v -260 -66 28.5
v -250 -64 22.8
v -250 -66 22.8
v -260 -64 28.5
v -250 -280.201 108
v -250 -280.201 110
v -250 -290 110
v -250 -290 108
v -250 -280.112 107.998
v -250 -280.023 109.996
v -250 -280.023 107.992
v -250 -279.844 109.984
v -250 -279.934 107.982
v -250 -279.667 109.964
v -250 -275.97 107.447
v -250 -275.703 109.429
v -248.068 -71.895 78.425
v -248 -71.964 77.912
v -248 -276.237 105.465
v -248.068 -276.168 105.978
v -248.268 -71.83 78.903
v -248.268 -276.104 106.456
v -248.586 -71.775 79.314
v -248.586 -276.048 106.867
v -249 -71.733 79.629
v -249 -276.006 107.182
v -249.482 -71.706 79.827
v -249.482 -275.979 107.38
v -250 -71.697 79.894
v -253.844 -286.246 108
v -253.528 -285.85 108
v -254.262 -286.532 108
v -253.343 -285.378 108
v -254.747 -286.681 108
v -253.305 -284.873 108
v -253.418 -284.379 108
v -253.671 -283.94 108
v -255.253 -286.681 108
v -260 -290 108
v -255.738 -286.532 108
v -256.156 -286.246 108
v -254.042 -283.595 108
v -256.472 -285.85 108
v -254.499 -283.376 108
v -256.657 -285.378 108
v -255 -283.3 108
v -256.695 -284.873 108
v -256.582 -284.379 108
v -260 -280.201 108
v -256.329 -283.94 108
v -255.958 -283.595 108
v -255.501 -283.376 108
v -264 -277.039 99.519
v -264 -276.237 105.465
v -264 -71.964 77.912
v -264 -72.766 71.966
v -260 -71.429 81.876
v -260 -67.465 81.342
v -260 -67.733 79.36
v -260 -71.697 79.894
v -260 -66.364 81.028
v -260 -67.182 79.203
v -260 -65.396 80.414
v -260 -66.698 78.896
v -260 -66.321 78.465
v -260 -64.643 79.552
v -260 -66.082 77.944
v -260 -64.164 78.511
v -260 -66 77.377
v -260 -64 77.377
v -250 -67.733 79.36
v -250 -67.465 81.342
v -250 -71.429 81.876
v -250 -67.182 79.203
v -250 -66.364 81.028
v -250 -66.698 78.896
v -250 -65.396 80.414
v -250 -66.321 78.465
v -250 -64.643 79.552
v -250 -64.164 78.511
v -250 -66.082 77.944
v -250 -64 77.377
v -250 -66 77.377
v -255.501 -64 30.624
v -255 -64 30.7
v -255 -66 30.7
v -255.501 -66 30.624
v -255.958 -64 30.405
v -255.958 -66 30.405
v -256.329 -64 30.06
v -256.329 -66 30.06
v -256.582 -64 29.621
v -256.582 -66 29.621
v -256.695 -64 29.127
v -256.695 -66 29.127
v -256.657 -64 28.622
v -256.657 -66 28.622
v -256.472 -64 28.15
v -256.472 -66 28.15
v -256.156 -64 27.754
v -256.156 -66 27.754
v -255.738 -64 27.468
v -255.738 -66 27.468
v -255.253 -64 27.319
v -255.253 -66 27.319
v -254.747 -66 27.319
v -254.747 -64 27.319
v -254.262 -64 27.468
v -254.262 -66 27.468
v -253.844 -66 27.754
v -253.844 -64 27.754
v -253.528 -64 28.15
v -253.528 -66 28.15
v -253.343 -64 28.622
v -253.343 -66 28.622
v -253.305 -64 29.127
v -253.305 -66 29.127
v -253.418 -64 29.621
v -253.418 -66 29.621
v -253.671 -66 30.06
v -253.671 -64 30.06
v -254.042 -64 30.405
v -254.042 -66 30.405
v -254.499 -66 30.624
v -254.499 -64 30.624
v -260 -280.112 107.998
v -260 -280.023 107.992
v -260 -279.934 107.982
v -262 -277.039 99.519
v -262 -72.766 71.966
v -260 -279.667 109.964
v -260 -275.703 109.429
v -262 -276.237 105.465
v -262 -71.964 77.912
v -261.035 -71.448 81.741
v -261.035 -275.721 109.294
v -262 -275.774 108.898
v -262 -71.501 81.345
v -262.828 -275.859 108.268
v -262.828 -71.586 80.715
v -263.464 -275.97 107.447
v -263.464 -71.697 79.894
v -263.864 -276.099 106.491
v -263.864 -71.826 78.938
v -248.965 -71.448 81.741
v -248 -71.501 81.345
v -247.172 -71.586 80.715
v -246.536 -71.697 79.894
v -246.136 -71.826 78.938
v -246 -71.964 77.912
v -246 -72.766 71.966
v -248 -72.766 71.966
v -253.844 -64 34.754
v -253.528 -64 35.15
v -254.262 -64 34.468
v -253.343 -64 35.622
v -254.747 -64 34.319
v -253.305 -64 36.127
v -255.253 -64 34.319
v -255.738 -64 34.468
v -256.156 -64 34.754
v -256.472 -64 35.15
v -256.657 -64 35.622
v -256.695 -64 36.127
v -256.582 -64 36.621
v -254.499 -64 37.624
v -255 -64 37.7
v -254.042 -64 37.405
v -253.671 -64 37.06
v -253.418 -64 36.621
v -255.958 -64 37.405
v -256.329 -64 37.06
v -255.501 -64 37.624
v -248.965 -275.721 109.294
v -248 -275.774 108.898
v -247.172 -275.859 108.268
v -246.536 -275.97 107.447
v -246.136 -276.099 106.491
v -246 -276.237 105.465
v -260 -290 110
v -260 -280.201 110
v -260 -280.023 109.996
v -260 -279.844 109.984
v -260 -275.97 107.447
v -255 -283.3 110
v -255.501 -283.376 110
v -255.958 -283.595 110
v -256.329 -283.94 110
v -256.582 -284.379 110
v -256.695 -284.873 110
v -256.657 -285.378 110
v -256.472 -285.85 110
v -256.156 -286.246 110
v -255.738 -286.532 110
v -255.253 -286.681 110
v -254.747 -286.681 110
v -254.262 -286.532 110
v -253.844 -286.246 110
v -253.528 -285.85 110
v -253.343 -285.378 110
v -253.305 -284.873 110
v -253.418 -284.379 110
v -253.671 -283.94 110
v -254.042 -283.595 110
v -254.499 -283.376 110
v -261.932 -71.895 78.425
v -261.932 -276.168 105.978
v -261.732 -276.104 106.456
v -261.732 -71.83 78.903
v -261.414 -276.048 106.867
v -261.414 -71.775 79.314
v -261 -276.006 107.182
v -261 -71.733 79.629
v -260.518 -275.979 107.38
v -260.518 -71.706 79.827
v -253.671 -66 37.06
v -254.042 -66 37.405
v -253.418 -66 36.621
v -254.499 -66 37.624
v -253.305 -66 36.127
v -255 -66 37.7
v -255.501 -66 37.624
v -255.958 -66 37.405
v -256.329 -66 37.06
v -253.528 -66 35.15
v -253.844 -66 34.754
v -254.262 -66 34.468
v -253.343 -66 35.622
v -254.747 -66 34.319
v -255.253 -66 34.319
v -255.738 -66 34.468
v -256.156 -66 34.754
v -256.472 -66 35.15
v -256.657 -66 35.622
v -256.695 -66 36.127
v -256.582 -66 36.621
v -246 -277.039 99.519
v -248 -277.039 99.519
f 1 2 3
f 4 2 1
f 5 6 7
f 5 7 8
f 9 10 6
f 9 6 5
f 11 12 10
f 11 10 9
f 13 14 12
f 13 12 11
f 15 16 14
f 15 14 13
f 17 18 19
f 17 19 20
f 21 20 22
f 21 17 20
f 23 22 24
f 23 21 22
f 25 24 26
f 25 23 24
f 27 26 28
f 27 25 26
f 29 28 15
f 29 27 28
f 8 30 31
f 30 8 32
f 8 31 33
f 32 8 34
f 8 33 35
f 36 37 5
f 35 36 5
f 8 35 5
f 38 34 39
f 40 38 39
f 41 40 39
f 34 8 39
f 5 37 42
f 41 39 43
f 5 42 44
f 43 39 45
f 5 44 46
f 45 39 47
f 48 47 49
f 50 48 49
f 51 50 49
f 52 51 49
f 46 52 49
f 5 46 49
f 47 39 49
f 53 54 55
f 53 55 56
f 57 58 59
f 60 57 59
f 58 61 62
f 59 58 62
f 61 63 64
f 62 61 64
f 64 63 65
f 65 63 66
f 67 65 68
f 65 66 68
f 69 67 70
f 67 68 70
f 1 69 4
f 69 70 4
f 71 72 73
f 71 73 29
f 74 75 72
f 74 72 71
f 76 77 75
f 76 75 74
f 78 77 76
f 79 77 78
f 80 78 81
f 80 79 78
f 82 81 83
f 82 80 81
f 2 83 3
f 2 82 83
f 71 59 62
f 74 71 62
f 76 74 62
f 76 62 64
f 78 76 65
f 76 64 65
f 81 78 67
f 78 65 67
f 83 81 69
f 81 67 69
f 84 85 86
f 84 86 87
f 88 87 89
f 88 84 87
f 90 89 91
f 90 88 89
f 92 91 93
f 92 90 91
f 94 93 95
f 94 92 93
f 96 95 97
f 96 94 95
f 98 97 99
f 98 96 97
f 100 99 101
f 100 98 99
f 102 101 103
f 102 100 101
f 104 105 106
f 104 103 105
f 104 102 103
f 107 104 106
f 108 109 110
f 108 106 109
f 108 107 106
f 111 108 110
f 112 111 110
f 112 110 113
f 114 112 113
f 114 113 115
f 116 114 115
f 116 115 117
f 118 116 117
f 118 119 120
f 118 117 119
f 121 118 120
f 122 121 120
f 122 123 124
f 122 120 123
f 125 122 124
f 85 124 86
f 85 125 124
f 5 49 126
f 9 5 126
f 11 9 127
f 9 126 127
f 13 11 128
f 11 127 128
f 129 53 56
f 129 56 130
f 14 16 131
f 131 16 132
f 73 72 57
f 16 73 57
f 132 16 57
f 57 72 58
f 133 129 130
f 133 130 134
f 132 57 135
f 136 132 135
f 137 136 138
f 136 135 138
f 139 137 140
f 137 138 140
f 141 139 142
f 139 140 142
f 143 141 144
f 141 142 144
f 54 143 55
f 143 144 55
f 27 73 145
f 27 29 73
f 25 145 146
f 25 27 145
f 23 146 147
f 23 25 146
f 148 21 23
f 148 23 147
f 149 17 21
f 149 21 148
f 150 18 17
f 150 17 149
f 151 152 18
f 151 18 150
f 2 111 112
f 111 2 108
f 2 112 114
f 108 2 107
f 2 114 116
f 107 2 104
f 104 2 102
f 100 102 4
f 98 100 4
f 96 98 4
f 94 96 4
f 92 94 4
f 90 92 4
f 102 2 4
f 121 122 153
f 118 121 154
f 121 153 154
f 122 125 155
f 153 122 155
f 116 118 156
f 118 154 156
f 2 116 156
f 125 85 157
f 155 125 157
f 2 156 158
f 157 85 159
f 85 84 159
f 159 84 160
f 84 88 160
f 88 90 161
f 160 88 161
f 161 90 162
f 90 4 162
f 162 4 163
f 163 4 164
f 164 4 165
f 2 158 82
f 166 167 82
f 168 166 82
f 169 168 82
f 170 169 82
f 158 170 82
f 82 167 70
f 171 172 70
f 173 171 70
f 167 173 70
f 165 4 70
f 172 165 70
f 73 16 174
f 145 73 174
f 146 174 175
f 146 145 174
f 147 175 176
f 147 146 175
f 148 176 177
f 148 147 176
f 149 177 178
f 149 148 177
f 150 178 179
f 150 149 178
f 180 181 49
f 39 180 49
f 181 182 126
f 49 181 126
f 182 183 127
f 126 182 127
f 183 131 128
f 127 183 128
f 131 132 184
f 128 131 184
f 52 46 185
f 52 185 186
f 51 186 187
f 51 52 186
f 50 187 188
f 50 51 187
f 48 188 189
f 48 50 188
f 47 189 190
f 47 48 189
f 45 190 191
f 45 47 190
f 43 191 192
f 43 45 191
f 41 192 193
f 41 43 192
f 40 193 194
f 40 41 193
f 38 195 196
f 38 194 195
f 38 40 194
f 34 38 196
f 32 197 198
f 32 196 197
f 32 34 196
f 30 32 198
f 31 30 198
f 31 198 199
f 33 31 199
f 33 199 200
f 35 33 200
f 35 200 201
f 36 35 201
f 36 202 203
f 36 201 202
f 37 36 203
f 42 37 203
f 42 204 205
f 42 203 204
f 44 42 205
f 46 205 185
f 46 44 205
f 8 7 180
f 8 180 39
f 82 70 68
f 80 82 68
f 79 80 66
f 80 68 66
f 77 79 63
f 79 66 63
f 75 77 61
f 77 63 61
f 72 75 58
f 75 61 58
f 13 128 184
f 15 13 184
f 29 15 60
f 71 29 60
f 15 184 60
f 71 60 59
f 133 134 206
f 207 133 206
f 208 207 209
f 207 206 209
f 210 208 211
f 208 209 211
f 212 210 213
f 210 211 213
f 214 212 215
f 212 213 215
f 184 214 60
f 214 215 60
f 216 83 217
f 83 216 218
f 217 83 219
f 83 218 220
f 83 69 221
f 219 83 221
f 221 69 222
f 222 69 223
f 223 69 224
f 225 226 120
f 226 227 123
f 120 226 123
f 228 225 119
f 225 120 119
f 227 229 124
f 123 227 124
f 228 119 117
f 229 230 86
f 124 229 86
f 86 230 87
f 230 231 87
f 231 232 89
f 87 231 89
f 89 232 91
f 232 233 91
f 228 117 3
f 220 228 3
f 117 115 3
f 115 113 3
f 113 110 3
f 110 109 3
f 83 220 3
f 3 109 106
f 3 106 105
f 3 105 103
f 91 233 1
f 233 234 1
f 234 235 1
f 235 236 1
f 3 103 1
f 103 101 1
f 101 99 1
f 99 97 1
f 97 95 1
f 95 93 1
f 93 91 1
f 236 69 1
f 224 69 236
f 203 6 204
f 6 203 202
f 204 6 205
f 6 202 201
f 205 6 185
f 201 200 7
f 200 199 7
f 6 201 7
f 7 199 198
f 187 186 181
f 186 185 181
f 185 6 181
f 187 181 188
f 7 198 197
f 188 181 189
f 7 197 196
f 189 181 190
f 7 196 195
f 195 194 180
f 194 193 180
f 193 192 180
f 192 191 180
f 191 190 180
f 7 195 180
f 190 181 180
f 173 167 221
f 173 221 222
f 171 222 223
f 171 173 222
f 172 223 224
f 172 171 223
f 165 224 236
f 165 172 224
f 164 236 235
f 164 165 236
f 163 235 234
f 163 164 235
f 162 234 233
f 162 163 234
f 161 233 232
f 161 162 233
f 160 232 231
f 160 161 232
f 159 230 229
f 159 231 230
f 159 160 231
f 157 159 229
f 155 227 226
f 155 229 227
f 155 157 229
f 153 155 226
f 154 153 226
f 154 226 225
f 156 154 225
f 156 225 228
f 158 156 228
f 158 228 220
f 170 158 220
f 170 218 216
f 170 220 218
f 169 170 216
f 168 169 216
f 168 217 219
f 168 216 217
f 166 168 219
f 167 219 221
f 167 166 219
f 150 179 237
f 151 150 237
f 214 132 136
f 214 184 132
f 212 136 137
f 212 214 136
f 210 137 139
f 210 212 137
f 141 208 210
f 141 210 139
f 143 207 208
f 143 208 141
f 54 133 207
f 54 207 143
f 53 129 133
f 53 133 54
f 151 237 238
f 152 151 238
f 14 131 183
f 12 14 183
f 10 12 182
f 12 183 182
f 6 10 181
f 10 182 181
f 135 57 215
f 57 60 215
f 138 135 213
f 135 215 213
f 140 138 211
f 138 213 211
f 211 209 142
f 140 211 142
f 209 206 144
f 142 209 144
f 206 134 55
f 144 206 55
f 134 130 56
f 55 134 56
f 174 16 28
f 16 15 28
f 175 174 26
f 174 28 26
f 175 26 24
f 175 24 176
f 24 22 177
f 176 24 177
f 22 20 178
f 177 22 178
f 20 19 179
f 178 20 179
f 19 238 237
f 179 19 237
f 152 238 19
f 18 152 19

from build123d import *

# Parameters (mm, degrees)
FORMED_WEB_DEPTH           = 10
EDGE_STIFFENING_LIPS_DEPTH = 206.123068282
WALL_MOUNT_HOLE_SKETCH_R   = 1.7
WALL_MOUNT_HOLES_DEPTH     = 2.4
COVER_MOUNT_HOLE_SKETCH_R  = 1.7
COVER_MOUNT_HOLE_DEPTH     = 2.4
LOWER_EDGE_CLEARANCE_DEPTH = 2.4


with BuildPart() as part:
    # Formed Web Section Sketch → Formed Web (new body)
    with BuildSketch(Plane(origin=(-260, 0, 0), x_dir=(0, 0, -1), z_dir=(1, 0, 0))):
        with BuildLine():
            Line((-22, -64), (-77.377483747, -64))
            ThreePointArc((-77.377483747, -64), (-80.010089753, -64.988457933), (-81.341585612, -67.46530719))
            Line((-81.341585612, -67.46530719), (-109.964101865, -279.66672079))
            ThreePointArc((-109.964101865, -279.66672079), (-109.991015376, -279.933465342), (-110, -280.2014136))
            Line((-110, -280.2014136), (-110, -290))
            Line((-110, -290), (-108, -290))
            Line((-108, -290), (-108, -280.2014136))
            ThreePointArc((-108, -280.2014136), (-107.995507688, -280.067439471), (-107.982050933, -279.934067195))
            Line((-107.982050933, -279.934067195), (-79.35953468, -67.732653595))
            ThreePointArc((-79.35953468, -67.732653595), (-78.69378675, -66.494228967), (-77.377483747, -66))
            Line((-77.377483747, -66), (-22, -66))
            Line((-22, -66), (-22, -64))
        make_face()
    extrude(amount=FORMED_WEB_DEPTH)

    # Edge Lip Sketch → Edge Stiffening Lips (add)
    with BuildSketch(Plane(origin=(0, -80.999511953, 10.925515566), x_dir=(-1, 0, 0), z_dir=(0, -0.9910254663478989, 0.1336732024376229))):
        with BuildLine():
            Line((264, -67.593279149), (264, -61.593279149))
            Line((264, -61.593279149), (262, -61.593279149))
            Line((262, -61.593279149), (262, -67.593279149))
            ThreePointArc((262, -67.593279149), (261.414213562, -69.007492712), (260, -69.593279149))
            Line((260, -69.593279149), (259.9, -69.593279149))
            Line((259.9, -69.593279149), (259.9, -71.593279149))
            Line((259.9, -71.593279149), (260, -71.593279149))
            ThreePointArc((260, -71.593279149), (262.828427125, -70.421706274), (264, -67.593279149))
        make_face()
        with BuildLine():
            Line((246, -67.593279149), (246, -61.593279149))
            Line((246, -61.593279149), (248, -61.593279149))
            Line((248, -61.593279149), (248, -67.593279149))
            ThreePointArc((248, -67.593279149), (248.585786438, -69.007492712), (250, -69.593279149))
            Line((250, -69.593279149), (250.1, -69.593279149))
            Line((250.1, -69.593279149), (250.1, -71.593279149))
            Line((250.1, -71.593279149), (250, -71.593279149))
            ThreePointArc((250, -71.593279149), (247.171572875, -70.421706274), (246, -67.593279149))
        make_face()
    extrude(amount=EDGE_STIFFENING_LIPS_DEPTH)

    # Wall Mount Hole Sketch → Wall Mount Holes (cut)
    with BuildSketch(Plane(origin=(0, -63.8, 0), x_dir=(-1, 0, 0), z_dir=(0, -1, 0))):
        with Locations(Location((255, -29, 0), (0, 0, 270))):
            Circle(WALL_MOUNT_HOLE_SKETCH_R)
        with Locations(Location((255, -36, 0), (0, 0, 270))):
            Circle(WALL_MOUNT_HOLE_SKETCH_R)
    extrude(amount=WALL_MOUNT_HOLES_DEPTH, mode=Mode.SUBTRACT)

    # Cover Mount Hole Sketch → Cover Mount Hole (cut)
    with BuildSketch(Plane.XY.offset(107.8)):
        with Locations(Location((-255, -285, 0), (0, 0, 90))):
            Circle(COVER_MOUNT_HOLE_SKETCH_R)
    extrude(amount=COVER_MOUNT_HOLE_DEPTH, mode=Mode.SUBTRACT)

    # Lower Edge Clearance Sketch → Lower Edge Clearance (cut)
    with BuildSketch(Plane(origin=(0, -63.8, 0), x_dir=(-1, 0, 0), z_dir=(0, -1, 0))):
        Polygon((261, -20), (249, -20), (249, -22.23), (261, -29.07), align=None)
    extrude(amount=LOWER_EDGE_CLEARANCE_DEPTH, mode=Mode.SUBTRACT)


solid = part.part
